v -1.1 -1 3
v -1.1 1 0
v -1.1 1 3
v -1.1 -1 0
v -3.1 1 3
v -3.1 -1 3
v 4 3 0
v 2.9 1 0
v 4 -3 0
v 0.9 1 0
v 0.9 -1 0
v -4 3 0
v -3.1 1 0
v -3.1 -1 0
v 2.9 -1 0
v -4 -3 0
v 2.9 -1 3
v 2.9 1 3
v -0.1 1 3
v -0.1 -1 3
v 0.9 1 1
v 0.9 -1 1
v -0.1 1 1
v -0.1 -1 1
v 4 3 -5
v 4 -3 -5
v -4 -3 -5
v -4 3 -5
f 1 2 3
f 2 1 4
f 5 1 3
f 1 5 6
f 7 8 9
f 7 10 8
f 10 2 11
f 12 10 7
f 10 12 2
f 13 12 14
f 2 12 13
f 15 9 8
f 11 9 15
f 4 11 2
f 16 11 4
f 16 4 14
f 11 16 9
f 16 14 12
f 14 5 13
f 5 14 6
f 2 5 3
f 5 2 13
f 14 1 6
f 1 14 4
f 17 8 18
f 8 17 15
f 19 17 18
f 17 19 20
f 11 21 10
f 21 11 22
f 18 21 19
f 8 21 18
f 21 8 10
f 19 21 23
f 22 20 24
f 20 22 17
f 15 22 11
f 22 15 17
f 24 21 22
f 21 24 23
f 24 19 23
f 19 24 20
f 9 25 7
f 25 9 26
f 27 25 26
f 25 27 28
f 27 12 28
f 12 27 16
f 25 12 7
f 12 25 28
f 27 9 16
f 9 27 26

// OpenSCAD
module stabilizer(wireDiameter, cubeSize)
{
    wireDiameter = 1;
    cubeSize = 2;

    cube([cubeSize, cubeSize, cubeSize + wireDiameter]);
    translate([wireDiameter * 2 + cubeSize, 0, 0])
    cube([cubeSize, cubeSize, cubeSize + wireDiameter]);
    translate([wireDiameter + cubeSize, 0, wireDiameter])
    cube([cubeSize, cubeSize, cubeSize]);
    
}

module fullStabilizer(width, length, height)
{
    translate(-[width / 2, length / 2, height])
    cube([width, length, height]);

    children(0);
}

WIRE_DIAMETER = 1.1;
CUBE_SIZE = 2;

MOUNT_LENGTH = 6;
MOUNT_WIDTH = 8;
MOUNT_HEIGHT = 5;

fullStabilizer(MOUNT_WIDTH, MOUNT_LENGTH, MOUNT_HEIGHT)
translate(-[(CUBE_SIZE * 2 + WIRE_DIAMETER * 2) / 2, CUBE_SIZE / 2, 0])
stabilizer(WIRE_DIAMETER, CUBE_SIZE);
    
